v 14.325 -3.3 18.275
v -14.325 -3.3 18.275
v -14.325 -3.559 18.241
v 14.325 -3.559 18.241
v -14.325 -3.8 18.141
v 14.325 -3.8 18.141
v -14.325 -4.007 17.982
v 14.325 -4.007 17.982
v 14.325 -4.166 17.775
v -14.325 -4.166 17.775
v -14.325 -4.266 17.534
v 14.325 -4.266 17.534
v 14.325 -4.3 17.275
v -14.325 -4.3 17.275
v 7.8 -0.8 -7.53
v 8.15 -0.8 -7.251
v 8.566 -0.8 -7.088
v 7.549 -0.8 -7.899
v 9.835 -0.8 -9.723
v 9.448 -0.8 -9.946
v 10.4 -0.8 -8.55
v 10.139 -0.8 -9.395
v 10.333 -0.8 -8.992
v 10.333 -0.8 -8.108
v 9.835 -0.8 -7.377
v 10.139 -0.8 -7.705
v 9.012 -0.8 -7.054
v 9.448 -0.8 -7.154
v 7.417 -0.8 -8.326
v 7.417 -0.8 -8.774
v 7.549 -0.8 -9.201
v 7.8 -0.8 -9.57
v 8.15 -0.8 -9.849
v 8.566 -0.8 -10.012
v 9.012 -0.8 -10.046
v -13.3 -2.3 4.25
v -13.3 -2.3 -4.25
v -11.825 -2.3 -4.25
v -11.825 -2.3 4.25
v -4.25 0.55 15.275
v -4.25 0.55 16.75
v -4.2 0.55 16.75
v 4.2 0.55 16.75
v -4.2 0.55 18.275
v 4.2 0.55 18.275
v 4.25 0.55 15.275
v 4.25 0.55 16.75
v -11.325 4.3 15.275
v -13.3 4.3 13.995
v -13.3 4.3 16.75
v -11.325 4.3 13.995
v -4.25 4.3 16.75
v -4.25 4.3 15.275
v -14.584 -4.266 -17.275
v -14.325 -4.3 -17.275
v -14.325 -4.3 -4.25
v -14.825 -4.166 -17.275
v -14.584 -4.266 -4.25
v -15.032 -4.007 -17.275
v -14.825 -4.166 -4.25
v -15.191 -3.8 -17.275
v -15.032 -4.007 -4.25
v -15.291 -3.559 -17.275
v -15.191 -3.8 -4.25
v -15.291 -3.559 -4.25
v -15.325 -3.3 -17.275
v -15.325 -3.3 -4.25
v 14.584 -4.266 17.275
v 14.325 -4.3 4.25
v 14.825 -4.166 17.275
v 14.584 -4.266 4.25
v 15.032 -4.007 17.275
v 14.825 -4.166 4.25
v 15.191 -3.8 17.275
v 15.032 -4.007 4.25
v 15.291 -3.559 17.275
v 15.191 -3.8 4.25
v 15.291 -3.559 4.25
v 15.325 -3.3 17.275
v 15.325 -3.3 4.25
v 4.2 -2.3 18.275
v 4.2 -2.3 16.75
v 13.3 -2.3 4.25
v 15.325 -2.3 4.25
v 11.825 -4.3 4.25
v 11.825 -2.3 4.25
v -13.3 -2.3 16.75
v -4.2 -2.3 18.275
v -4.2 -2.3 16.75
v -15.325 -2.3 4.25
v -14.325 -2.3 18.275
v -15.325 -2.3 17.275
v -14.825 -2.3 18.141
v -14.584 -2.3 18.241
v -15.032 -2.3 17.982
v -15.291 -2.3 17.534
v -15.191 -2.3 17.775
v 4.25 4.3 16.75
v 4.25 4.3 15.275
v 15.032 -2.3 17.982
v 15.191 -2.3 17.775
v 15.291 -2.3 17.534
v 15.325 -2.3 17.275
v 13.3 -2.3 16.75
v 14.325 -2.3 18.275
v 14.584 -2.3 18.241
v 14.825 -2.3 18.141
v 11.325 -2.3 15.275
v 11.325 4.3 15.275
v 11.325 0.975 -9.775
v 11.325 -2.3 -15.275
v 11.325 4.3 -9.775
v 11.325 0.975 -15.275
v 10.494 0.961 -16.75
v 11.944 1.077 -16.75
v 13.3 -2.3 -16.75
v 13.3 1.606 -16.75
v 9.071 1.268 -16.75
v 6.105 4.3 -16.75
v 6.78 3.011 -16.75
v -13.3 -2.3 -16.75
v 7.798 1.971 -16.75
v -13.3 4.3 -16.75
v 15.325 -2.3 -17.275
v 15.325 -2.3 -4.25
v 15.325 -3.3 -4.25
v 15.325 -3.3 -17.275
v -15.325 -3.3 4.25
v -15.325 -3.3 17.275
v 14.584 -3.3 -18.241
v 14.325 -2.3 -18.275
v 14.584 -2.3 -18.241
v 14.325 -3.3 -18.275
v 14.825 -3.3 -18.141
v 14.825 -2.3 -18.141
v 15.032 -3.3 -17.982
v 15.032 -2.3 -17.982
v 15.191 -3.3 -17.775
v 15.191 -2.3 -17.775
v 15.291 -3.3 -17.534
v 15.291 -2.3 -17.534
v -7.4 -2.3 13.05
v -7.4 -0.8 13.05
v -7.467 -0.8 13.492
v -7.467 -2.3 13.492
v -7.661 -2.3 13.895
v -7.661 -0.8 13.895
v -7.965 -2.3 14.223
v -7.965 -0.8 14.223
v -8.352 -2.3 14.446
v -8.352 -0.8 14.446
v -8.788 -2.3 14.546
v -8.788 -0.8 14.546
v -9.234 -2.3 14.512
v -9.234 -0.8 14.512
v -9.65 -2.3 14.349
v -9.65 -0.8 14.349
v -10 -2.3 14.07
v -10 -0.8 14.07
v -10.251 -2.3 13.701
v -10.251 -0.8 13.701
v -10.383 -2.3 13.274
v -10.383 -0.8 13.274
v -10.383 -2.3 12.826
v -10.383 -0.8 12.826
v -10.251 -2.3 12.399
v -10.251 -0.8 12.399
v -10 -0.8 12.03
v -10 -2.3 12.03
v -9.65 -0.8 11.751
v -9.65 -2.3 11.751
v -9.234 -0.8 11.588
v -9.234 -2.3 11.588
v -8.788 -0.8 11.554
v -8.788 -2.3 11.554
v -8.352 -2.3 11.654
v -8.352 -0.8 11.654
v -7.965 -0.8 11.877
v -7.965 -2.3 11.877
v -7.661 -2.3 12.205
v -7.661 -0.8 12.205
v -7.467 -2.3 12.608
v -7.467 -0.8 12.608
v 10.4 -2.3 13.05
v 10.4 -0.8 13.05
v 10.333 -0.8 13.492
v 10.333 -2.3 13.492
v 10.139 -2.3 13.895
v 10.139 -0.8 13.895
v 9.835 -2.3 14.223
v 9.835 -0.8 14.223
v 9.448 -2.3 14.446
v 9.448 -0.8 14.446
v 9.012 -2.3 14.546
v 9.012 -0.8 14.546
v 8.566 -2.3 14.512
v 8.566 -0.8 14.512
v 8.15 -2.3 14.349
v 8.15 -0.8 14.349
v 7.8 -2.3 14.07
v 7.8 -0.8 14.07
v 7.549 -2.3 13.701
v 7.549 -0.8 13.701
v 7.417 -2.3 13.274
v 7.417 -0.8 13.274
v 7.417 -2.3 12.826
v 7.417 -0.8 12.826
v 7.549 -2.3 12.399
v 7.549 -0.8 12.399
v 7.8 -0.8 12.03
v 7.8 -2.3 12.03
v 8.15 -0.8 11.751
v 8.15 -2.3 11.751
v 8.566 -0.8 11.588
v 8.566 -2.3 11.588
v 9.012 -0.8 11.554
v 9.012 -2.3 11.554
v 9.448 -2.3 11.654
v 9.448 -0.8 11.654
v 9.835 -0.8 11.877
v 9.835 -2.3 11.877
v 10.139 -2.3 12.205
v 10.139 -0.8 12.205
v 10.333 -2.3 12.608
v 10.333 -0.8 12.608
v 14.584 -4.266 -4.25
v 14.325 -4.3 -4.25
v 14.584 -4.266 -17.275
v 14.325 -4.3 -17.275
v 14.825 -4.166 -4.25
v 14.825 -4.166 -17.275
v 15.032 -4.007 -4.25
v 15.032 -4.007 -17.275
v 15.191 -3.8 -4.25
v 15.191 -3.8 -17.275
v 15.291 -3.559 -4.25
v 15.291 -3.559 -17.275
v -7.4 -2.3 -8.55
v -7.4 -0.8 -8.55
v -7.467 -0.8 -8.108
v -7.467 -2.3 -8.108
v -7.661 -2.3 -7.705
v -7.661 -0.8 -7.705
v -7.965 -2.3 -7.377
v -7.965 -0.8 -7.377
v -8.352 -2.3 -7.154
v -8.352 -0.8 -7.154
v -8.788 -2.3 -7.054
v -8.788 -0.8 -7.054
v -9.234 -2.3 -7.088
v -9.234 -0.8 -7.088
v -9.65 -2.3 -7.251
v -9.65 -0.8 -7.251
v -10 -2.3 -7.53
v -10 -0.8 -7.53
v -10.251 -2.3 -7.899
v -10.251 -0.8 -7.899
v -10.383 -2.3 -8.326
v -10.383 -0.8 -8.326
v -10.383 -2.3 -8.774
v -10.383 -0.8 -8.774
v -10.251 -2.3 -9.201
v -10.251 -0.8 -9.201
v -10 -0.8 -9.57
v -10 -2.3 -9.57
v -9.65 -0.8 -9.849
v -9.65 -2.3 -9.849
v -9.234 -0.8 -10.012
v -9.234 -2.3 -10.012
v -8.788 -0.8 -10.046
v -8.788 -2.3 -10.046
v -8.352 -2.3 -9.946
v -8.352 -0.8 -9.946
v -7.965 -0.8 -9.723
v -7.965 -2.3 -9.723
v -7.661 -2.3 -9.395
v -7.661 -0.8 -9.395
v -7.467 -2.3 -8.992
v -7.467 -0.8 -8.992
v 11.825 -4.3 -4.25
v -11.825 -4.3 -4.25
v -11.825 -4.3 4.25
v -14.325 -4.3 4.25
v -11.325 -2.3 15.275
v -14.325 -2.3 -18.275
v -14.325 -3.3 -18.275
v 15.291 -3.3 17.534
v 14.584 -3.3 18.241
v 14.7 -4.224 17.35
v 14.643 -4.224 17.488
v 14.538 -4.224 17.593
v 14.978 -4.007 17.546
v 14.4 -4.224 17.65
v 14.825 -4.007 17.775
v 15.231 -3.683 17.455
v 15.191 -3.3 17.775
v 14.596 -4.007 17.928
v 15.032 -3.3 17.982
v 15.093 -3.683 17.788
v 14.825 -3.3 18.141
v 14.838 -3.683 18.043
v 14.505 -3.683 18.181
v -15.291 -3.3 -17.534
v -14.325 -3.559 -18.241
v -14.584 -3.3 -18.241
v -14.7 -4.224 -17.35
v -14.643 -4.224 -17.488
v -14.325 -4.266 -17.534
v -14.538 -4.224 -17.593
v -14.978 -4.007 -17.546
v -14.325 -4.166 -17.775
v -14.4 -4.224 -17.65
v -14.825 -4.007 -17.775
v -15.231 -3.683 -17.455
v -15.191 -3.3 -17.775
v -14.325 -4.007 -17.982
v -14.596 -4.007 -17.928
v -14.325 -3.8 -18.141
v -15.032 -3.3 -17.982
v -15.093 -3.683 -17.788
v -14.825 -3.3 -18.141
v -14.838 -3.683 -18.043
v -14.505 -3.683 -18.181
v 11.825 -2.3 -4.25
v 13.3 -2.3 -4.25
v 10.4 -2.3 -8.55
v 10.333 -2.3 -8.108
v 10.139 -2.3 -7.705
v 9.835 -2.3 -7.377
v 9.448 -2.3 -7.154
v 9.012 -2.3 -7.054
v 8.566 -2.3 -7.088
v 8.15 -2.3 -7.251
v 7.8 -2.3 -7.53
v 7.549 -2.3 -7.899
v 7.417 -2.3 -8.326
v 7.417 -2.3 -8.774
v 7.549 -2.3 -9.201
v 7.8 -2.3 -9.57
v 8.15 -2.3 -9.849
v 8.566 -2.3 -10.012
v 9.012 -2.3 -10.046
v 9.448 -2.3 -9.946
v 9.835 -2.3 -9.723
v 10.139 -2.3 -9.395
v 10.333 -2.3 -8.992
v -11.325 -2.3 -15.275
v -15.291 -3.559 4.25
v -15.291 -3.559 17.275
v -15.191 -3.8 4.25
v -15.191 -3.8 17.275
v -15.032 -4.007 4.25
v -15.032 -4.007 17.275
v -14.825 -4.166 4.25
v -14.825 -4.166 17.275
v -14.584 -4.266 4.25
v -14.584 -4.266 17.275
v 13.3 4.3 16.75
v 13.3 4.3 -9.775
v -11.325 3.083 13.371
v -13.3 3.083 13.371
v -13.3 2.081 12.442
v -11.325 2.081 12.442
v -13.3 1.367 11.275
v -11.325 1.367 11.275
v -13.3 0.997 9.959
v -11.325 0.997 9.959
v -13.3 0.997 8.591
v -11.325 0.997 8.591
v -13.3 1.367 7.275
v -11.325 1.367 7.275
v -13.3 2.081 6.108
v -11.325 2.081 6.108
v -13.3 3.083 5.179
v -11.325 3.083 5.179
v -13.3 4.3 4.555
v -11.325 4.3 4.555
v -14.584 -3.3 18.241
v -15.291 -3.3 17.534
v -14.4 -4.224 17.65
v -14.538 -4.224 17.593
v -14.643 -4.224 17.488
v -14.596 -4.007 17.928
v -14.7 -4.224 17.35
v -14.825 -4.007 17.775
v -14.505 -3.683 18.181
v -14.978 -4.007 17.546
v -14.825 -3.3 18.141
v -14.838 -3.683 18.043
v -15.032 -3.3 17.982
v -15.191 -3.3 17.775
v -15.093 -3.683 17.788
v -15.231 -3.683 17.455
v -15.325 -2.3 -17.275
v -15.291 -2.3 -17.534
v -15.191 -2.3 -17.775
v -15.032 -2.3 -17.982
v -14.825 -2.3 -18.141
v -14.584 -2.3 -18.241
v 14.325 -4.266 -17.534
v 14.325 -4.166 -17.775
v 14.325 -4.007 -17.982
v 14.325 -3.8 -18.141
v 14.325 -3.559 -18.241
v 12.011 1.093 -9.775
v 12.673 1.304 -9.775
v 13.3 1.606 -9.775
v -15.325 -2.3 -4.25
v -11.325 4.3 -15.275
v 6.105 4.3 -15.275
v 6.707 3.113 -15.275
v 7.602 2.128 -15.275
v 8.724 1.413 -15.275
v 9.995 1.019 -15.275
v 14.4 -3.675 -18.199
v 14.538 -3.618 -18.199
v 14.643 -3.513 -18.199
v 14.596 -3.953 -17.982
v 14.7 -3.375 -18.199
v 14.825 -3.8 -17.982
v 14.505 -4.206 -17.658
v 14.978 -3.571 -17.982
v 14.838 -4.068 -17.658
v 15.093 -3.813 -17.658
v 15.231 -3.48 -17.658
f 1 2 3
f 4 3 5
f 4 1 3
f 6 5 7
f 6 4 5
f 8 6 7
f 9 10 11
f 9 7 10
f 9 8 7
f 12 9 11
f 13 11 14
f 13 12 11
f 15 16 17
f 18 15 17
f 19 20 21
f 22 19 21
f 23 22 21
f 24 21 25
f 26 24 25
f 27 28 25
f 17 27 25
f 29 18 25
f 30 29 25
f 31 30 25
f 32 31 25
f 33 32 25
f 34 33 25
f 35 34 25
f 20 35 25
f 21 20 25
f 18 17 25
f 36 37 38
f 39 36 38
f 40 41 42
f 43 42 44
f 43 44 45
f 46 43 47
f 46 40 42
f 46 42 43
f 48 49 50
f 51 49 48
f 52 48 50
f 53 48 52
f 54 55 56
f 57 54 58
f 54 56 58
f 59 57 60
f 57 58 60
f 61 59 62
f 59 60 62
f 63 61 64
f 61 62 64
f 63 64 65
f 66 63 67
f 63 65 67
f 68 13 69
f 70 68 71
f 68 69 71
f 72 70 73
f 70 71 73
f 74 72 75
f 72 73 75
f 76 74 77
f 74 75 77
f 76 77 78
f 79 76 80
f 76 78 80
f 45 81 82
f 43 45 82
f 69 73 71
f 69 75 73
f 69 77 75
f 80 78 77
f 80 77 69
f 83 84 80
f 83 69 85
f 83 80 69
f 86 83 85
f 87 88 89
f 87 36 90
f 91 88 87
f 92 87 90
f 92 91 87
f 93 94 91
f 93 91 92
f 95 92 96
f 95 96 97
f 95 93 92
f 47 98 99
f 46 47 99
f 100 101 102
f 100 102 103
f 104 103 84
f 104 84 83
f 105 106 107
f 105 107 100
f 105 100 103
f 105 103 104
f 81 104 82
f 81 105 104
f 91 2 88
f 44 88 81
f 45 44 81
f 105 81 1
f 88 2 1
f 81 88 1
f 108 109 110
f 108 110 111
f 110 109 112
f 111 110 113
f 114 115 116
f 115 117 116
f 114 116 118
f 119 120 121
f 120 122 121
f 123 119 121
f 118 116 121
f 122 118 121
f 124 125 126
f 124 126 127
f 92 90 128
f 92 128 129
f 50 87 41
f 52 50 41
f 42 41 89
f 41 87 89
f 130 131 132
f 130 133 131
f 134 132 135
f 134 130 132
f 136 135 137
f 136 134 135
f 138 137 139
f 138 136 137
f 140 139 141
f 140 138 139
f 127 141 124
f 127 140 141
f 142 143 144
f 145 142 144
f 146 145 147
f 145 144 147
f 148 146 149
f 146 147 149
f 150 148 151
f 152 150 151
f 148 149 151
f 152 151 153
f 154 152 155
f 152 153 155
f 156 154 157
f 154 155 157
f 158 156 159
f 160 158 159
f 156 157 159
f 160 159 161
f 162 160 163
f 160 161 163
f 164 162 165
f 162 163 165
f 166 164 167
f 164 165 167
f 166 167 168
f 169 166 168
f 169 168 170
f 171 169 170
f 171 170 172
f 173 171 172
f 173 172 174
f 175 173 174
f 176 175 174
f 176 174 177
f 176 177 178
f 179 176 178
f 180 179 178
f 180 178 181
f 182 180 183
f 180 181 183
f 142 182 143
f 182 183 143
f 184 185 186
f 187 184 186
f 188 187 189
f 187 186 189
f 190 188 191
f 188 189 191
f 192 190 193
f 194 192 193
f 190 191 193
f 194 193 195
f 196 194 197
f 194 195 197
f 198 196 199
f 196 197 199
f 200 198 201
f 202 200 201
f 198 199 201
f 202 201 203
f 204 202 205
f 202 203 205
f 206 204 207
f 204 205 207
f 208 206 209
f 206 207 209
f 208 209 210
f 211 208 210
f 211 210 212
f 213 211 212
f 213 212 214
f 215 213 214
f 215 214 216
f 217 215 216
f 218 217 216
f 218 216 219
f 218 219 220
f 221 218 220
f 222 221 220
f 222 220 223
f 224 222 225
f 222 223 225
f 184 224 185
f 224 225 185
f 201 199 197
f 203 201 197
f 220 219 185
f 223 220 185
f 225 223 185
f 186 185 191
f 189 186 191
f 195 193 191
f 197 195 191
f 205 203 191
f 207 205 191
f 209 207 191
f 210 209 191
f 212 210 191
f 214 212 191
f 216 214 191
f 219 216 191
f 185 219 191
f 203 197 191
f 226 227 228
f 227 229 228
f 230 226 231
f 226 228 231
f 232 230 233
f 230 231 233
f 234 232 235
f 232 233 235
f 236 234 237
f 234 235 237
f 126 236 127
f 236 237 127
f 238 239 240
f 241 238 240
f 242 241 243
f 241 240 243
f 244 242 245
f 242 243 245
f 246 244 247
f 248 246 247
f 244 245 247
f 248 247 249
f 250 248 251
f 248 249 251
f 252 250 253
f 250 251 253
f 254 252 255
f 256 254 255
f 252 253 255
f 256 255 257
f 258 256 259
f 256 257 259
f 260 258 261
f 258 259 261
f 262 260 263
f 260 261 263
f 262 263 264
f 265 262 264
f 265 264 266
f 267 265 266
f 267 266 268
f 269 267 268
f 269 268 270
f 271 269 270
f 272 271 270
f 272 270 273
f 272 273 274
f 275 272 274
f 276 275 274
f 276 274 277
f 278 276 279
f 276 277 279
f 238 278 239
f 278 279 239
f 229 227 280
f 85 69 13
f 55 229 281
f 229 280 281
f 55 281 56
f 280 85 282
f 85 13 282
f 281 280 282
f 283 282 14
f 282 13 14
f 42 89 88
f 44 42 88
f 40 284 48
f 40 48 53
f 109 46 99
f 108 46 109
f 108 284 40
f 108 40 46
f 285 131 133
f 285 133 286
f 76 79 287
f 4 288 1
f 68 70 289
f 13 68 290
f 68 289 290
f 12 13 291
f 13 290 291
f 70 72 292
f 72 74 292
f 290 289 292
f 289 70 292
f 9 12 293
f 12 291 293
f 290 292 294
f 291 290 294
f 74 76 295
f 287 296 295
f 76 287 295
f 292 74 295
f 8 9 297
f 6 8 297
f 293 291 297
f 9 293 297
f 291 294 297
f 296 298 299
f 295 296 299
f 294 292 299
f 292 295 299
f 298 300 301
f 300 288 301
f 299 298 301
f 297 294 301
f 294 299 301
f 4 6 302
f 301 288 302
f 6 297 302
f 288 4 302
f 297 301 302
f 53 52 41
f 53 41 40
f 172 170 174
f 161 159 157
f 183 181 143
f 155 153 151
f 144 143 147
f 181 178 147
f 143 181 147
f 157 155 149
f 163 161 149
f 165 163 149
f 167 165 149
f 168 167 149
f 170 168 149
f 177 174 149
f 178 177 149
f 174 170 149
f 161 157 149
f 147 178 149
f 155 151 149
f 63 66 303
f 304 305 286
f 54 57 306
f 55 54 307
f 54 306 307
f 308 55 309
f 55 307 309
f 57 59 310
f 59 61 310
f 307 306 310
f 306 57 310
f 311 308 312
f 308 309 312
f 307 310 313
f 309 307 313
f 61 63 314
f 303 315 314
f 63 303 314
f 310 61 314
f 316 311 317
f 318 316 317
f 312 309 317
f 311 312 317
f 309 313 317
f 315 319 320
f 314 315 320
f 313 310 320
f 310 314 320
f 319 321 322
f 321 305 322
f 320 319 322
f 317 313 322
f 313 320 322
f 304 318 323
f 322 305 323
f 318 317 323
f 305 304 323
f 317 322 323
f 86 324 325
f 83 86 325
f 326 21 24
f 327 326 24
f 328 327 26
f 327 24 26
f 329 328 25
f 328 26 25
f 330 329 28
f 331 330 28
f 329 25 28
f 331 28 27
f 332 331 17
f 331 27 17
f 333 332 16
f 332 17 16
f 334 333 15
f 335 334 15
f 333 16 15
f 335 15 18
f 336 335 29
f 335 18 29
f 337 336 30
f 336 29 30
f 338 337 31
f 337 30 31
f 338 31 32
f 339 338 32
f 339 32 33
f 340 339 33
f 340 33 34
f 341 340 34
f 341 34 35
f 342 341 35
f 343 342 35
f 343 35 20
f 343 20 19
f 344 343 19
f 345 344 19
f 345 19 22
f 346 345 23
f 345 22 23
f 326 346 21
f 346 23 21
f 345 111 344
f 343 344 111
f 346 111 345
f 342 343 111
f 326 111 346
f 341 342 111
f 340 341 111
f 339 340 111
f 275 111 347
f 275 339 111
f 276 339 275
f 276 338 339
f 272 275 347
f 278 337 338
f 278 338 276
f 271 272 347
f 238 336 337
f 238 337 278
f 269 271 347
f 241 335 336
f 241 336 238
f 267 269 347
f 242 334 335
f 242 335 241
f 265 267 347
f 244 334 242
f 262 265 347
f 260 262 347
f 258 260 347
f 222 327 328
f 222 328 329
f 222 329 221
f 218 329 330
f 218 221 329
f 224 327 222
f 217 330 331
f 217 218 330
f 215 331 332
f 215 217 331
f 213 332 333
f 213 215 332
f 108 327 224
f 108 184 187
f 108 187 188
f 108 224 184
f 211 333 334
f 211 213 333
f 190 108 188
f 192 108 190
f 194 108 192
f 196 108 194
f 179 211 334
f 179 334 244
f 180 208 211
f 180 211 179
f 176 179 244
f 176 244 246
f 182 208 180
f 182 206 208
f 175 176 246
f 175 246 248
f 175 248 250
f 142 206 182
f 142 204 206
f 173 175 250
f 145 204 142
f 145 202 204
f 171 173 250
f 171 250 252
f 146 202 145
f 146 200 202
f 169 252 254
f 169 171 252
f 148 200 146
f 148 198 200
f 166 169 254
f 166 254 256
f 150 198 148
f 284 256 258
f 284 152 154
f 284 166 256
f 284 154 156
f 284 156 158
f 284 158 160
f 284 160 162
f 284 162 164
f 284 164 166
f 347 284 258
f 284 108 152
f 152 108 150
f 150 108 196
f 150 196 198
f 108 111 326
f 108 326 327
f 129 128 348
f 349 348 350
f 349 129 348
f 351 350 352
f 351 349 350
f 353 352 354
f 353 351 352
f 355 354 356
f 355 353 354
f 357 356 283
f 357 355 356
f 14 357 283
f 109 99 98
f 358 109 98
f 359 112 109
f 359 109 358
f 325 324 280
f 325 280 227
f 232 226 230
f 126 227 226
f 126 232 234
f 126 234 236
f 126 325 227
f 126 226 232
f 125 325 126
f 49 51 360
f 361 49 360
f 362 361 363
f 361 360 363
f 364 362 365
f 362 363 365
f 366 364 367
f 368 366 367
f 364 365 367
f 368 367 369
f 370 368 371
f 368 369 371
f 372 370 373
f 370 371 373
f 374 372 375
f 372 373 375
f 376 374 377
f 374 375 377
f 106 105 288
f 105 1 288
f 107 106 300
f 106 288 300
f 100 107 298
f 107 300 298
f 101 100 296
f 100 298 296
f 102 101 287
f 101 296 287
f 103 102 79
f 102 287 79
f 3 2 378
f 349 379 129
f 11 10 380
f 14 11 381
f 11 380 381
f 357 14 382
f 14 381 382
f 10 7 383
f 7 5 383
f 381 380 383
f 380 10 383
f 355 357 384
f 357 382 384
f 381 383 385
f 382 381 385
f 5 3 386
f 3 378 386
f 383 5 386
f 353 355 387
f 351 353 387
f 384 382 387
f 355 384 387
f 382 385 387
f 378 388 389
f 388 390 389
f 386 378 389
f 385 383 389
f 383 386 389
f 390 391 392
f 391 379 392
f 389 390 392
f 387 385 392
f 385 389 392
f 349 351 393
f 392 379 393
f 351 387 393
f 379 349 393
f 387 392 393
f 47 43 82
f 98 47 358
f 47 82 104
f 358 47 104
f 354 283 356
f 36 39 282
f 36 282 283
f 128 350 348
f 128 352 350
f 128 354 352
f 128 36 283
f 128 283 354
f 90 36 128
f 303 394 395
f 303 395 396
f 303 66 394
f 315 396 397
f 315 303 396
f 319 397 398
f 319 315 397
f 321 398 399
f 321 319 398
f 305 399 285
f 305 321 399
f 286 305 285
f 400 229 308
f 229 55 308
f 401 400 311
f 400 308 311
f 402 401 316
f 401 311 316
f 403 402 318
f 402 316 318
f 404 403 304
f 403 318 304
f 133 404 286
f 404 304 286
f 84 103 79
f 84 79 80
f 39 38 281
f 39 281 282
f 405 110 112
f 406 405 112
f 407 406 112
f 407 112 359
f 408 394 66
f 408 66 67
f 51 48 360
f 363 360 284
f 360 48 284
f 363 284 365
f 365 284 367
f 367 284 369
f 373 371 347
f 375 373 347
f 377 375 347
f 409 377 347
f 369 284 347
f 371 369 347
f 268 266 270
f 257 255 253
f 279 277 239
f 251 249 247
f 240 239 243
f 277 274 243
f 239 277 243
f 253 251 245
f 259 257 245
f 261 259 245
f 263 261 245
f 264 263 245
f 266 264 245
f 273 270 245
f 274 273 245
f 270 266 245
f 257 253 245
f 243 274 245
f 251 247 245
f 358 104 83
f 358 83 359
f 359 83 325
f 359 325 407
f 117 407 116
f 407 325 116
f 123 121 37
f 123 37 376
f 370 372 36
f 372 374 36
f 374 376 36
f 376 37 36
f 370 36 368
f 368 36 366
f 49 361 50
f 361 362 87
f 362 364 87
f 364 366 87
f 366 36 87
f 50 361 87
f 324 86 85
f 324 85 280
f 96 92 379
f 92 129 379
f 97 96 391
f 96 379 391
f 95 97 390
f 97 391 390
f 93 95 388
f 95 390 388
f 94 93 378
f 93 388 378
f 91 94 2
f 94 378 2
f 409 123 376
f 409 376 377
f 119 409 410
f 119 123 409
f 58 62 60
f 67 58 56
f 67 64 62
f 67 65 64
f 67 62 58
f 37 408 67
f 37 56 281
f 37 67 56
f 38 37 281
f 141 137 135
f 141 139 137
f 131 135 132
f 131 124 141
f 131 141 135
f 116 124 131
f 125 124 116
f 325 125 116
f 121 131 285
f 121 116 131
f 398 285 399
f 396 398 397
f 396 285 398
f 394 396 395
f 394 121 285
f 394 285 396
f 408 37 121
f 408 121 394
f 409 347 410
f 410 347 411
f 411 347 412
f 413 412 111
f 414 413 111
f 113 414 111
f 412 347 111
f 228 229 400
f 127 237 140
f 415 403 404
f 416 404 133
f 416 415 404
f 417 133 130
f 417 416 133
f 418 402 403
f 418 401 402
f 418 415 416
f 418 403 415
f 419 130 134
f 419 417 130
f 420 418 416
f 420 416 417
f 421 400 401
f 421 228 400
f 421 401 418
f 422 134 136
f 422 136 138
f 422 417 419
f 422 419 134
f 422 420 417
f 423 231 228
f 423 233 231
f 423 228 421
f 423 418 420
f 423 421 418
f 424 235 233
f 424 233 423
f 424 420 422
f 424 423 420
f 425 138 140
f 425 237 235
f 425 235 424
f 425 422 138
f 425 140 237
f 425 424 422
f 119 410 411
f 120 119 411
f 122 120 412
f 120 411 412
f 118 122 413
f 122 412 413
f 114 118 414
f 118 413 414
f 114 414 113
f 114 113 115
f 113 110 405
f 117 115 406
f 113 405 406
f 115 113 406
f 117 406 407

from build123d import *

# Parameters (mm, degrees)
SKETCH1_R               = 1
BOSS_EXTRUDE1_DEPTH     = 1.6
BOSS_EXTRUDE1_2_DEPTH   = 1.6
BOSS_EXTRUDE1_3_DEPTH   = 1.6
BOSS_EXTRUDE1_4_DEPTH   = 1.6
SKETCH2_R               = 1.5
BOSS_EXTRUDE2_DEPTH     = 1.5
BOSS_EXTRUDE3_DEPTH     = 2
SKETCH4_W               = 22.65
SKETCH4_H               = 30.55
BOSS_EXTRUDE4_DEPTH     = 6.6
SKETCH5_W               = 8.5
SKETCH5_H               = 3
CUT_EXTRUDE1_DEPTH      = 3.75
FILLET1_R               = 1
SKETCH6_R               = 5
CUT_EXTRUDE2_DEPTH      = 9
SKETCH8_R               = 5
CUT_EXTRUDE3_DEPTH      = 0.5
CUT_EXTRUDE3_DEPTH_BACK = 9
SKETCH9_W               = 22.65
SKETCH9_H               = 30.55
CUT_EXTRUDE4_DEPTH      = 1.6


with BuildPart() as part:
    # Sketch1 → Boss-Extrude1 (new body)
    with BuildSketch(Plane(origin=(0, 0.8, 0), x_dir=(1, 0, 0), z_dir=(0, 1, 0))):
        with Locations((-8.9, -13.05)):
            Circle(SKETCH1_R)
    extrude(amount=-BOSS_EXTRUDE1_DEPTH)



with BuildPart() as body_2:
    # Sketch1 → Boss-Extrude1 2 (new body)
    with BuildSketch(Plane(origin=(0, 0.8, 0), x_dir=(1, 0, 0), z_dir=(0, 1, 0))):
        with Locations((-8.9, 8.55)):
            Circle(SKETCH1_R)
    extrude(amount=-BOSS_EXTRUDE1_2_DEPTH)


with BuildPart() as body_3:
    # Sketch1 → Boss-Extrude1 3 (new body)
    with BuildSketch(Plane(origin=(0, 0.8, 0), x_dir=(1, 0, 0), z_dir=(0, 1, 0))):
        with Locations((8.9, 8.55)):
            Circle(SKETCH1_R)
    extrude(amount=-BOSS_EXTRUDE1_3_DEPTH)


with BuildPart() as body_4:
    # Sketch1 → Boss-Extrude1 4 (new body)
    with BuildSketch(Plane(origin=(0, 0.8, 0), x_dir=(1, 0, 0), z_dir=(0, 1, 0))):
        with Locations((8.9, -13.05)):
            Circle(SKETCH1_R)
    extrude(amount=-BOSS_EXTRUDE1_4_DEPTH)


with BuildPart() as part_1:
    add(part.part)

    add(body_2.part)  # Boss-Extrude2 merges body 2

    add(body_3.part)  # Boss-Extrude2 merges body 3

    add(body_4.part)  # Boss-Extrude2 merges body 4
    # Sketch2 → Boss-Extrude2 (add)
    with BuildSketch(Plane.XZ.offset(0.8)):
        with Locations((-8.9, -8.55)):
            Circle(SKETCH2_R)
        with Locations((-8.9, 13.05)):
            Circle(SKETCH2_R)
        with Locations((8.9, 13.05)):
            Circle(SKETCH2_R)
        with Locations((8.9, -8.55)):
            Circle(SKETCH2_R)
    extrude(amount=BOSS_EXTRUDE2_DEPTH)

    # Sketch3 → Boss-Extrude3 (add)
    with BuildSketch(Plane.XZ.offset(2.3)):
        Polygon((-15.325, 18.275), (15.325, 18.275), (15.325, 4.25), (11.825, 4.25), (11.825, -4.25), (15.325, -4.25), (15.325, -18.275), (-15.325, -18.275), (-15.325, -4.25), (-11.825, -4.25), (-11.825, 4.25), (-15.325, 4.25), align=None)
    extrude(amount=BOSS_EXTRUDE3_DEPTH)

    # Sketch4 → Boss-Extrude4 (add)
    with BuildSketch(Plane(origin=(0, -2.3, 0), x_dir=(1, 0, 0), z_dir=(0, 1, 0))):
        Polygon((-13.3, -16.75), (-4.2, -16.75), (-4.2, -18.275), (4.2, -18.275), (4.2, -16.75), (13.3, -16.75), (13.3, -4.5), (13.3, 4.5), (13.3, 16.75), (-13.3, 16.75), (-13.3, 4.5), (-13.3, -4.5), align=None)
        Rectangle(SKETCH4_W, SKETCH4_H, mode=Mode.SUBTRACT)
    extrude(amount=BOSS_EXTRUDE4_DEPTH)

    # Sketch5 → Cut-Extrude1 (cut)
    with BuildSketch(Plane(origin=(0, 4.3, 0), x_dir=(1, 0, 0), z_dir=(0, 1, 0))):
        with Locations((0, -16.775)):
            Rectangle(SKETCH5_W, SKETCH5_H)
    extrude(amount=-CUT_EXTRUDE1_DEPTH, mode=Mode.SUBTRACT)

    # Fillet1
    fillet1_edges = [part_1.edges().sort_by_distance(p)[0] for p in [
        (15.325, -3.3, 18.275),
        (-15.325, -3.3, 18.275),
        (-15.325, -3.3, -18.275),
        (15.325, -4.3, -11.2625),
        (15.325, -4.3, 11.2625),
        (0, -4.3, 18.275),
        (-15.325, -4.3, 11.2625),
        (-15.325, -4.3, -11.2625),
        (0, -4.3, -18.275),
        (15.325, -3.3, -18.275),
    ]]
    fillet(fillet1_edges, radius=FILLET1_R)

    # Sketch6 → Cut-Extrude2 (cut, through all)
    with BuildSketch(Plane(origin=(-7.325, 0, 0), x_dir=(0, 0, -1), z_dir=(1, 0, 0))):
        with Locations((-9.275, 5.95)):
            Circle(SKETCH6_R)
    extrude(amount=-CUT_EXTRUDE2_DEPTH, mode=Mode.SUBTRACT)

    # Sketch8 → Cut-Extrude3 (cut, two sides)
    with BuildSketch(Plane.XY.offset(-10.275)) as cut_extrude3_sk:
        with Locations((10.825, 5.95)):
            Circle(SKETCH8_R)
    extrude(amount=CUT_EXTRUDE3_DEPTH, mode=Mode.SUBTRACT)
    extrude(cut_extrude3_sk.sketch, amount=-CUT_EXTRUDE3_DEPTH_BACK, mode=Mode.SUBTRACT)

    # Sketch9 → Cut-Extrude4 (cut)
    with BuildSketch(Plane(origin=(0, 0.8, 0), x_dir=(1, 0, 0), z_dir=(0, 1, 0))):
        Rectangle(SKETCH9_W, SKETCH9_H)
    extrude(amount=-CUT_EXTRUDE4_DEPTH, mode=Mode.SUBTRACT)


solid = part_1.part
